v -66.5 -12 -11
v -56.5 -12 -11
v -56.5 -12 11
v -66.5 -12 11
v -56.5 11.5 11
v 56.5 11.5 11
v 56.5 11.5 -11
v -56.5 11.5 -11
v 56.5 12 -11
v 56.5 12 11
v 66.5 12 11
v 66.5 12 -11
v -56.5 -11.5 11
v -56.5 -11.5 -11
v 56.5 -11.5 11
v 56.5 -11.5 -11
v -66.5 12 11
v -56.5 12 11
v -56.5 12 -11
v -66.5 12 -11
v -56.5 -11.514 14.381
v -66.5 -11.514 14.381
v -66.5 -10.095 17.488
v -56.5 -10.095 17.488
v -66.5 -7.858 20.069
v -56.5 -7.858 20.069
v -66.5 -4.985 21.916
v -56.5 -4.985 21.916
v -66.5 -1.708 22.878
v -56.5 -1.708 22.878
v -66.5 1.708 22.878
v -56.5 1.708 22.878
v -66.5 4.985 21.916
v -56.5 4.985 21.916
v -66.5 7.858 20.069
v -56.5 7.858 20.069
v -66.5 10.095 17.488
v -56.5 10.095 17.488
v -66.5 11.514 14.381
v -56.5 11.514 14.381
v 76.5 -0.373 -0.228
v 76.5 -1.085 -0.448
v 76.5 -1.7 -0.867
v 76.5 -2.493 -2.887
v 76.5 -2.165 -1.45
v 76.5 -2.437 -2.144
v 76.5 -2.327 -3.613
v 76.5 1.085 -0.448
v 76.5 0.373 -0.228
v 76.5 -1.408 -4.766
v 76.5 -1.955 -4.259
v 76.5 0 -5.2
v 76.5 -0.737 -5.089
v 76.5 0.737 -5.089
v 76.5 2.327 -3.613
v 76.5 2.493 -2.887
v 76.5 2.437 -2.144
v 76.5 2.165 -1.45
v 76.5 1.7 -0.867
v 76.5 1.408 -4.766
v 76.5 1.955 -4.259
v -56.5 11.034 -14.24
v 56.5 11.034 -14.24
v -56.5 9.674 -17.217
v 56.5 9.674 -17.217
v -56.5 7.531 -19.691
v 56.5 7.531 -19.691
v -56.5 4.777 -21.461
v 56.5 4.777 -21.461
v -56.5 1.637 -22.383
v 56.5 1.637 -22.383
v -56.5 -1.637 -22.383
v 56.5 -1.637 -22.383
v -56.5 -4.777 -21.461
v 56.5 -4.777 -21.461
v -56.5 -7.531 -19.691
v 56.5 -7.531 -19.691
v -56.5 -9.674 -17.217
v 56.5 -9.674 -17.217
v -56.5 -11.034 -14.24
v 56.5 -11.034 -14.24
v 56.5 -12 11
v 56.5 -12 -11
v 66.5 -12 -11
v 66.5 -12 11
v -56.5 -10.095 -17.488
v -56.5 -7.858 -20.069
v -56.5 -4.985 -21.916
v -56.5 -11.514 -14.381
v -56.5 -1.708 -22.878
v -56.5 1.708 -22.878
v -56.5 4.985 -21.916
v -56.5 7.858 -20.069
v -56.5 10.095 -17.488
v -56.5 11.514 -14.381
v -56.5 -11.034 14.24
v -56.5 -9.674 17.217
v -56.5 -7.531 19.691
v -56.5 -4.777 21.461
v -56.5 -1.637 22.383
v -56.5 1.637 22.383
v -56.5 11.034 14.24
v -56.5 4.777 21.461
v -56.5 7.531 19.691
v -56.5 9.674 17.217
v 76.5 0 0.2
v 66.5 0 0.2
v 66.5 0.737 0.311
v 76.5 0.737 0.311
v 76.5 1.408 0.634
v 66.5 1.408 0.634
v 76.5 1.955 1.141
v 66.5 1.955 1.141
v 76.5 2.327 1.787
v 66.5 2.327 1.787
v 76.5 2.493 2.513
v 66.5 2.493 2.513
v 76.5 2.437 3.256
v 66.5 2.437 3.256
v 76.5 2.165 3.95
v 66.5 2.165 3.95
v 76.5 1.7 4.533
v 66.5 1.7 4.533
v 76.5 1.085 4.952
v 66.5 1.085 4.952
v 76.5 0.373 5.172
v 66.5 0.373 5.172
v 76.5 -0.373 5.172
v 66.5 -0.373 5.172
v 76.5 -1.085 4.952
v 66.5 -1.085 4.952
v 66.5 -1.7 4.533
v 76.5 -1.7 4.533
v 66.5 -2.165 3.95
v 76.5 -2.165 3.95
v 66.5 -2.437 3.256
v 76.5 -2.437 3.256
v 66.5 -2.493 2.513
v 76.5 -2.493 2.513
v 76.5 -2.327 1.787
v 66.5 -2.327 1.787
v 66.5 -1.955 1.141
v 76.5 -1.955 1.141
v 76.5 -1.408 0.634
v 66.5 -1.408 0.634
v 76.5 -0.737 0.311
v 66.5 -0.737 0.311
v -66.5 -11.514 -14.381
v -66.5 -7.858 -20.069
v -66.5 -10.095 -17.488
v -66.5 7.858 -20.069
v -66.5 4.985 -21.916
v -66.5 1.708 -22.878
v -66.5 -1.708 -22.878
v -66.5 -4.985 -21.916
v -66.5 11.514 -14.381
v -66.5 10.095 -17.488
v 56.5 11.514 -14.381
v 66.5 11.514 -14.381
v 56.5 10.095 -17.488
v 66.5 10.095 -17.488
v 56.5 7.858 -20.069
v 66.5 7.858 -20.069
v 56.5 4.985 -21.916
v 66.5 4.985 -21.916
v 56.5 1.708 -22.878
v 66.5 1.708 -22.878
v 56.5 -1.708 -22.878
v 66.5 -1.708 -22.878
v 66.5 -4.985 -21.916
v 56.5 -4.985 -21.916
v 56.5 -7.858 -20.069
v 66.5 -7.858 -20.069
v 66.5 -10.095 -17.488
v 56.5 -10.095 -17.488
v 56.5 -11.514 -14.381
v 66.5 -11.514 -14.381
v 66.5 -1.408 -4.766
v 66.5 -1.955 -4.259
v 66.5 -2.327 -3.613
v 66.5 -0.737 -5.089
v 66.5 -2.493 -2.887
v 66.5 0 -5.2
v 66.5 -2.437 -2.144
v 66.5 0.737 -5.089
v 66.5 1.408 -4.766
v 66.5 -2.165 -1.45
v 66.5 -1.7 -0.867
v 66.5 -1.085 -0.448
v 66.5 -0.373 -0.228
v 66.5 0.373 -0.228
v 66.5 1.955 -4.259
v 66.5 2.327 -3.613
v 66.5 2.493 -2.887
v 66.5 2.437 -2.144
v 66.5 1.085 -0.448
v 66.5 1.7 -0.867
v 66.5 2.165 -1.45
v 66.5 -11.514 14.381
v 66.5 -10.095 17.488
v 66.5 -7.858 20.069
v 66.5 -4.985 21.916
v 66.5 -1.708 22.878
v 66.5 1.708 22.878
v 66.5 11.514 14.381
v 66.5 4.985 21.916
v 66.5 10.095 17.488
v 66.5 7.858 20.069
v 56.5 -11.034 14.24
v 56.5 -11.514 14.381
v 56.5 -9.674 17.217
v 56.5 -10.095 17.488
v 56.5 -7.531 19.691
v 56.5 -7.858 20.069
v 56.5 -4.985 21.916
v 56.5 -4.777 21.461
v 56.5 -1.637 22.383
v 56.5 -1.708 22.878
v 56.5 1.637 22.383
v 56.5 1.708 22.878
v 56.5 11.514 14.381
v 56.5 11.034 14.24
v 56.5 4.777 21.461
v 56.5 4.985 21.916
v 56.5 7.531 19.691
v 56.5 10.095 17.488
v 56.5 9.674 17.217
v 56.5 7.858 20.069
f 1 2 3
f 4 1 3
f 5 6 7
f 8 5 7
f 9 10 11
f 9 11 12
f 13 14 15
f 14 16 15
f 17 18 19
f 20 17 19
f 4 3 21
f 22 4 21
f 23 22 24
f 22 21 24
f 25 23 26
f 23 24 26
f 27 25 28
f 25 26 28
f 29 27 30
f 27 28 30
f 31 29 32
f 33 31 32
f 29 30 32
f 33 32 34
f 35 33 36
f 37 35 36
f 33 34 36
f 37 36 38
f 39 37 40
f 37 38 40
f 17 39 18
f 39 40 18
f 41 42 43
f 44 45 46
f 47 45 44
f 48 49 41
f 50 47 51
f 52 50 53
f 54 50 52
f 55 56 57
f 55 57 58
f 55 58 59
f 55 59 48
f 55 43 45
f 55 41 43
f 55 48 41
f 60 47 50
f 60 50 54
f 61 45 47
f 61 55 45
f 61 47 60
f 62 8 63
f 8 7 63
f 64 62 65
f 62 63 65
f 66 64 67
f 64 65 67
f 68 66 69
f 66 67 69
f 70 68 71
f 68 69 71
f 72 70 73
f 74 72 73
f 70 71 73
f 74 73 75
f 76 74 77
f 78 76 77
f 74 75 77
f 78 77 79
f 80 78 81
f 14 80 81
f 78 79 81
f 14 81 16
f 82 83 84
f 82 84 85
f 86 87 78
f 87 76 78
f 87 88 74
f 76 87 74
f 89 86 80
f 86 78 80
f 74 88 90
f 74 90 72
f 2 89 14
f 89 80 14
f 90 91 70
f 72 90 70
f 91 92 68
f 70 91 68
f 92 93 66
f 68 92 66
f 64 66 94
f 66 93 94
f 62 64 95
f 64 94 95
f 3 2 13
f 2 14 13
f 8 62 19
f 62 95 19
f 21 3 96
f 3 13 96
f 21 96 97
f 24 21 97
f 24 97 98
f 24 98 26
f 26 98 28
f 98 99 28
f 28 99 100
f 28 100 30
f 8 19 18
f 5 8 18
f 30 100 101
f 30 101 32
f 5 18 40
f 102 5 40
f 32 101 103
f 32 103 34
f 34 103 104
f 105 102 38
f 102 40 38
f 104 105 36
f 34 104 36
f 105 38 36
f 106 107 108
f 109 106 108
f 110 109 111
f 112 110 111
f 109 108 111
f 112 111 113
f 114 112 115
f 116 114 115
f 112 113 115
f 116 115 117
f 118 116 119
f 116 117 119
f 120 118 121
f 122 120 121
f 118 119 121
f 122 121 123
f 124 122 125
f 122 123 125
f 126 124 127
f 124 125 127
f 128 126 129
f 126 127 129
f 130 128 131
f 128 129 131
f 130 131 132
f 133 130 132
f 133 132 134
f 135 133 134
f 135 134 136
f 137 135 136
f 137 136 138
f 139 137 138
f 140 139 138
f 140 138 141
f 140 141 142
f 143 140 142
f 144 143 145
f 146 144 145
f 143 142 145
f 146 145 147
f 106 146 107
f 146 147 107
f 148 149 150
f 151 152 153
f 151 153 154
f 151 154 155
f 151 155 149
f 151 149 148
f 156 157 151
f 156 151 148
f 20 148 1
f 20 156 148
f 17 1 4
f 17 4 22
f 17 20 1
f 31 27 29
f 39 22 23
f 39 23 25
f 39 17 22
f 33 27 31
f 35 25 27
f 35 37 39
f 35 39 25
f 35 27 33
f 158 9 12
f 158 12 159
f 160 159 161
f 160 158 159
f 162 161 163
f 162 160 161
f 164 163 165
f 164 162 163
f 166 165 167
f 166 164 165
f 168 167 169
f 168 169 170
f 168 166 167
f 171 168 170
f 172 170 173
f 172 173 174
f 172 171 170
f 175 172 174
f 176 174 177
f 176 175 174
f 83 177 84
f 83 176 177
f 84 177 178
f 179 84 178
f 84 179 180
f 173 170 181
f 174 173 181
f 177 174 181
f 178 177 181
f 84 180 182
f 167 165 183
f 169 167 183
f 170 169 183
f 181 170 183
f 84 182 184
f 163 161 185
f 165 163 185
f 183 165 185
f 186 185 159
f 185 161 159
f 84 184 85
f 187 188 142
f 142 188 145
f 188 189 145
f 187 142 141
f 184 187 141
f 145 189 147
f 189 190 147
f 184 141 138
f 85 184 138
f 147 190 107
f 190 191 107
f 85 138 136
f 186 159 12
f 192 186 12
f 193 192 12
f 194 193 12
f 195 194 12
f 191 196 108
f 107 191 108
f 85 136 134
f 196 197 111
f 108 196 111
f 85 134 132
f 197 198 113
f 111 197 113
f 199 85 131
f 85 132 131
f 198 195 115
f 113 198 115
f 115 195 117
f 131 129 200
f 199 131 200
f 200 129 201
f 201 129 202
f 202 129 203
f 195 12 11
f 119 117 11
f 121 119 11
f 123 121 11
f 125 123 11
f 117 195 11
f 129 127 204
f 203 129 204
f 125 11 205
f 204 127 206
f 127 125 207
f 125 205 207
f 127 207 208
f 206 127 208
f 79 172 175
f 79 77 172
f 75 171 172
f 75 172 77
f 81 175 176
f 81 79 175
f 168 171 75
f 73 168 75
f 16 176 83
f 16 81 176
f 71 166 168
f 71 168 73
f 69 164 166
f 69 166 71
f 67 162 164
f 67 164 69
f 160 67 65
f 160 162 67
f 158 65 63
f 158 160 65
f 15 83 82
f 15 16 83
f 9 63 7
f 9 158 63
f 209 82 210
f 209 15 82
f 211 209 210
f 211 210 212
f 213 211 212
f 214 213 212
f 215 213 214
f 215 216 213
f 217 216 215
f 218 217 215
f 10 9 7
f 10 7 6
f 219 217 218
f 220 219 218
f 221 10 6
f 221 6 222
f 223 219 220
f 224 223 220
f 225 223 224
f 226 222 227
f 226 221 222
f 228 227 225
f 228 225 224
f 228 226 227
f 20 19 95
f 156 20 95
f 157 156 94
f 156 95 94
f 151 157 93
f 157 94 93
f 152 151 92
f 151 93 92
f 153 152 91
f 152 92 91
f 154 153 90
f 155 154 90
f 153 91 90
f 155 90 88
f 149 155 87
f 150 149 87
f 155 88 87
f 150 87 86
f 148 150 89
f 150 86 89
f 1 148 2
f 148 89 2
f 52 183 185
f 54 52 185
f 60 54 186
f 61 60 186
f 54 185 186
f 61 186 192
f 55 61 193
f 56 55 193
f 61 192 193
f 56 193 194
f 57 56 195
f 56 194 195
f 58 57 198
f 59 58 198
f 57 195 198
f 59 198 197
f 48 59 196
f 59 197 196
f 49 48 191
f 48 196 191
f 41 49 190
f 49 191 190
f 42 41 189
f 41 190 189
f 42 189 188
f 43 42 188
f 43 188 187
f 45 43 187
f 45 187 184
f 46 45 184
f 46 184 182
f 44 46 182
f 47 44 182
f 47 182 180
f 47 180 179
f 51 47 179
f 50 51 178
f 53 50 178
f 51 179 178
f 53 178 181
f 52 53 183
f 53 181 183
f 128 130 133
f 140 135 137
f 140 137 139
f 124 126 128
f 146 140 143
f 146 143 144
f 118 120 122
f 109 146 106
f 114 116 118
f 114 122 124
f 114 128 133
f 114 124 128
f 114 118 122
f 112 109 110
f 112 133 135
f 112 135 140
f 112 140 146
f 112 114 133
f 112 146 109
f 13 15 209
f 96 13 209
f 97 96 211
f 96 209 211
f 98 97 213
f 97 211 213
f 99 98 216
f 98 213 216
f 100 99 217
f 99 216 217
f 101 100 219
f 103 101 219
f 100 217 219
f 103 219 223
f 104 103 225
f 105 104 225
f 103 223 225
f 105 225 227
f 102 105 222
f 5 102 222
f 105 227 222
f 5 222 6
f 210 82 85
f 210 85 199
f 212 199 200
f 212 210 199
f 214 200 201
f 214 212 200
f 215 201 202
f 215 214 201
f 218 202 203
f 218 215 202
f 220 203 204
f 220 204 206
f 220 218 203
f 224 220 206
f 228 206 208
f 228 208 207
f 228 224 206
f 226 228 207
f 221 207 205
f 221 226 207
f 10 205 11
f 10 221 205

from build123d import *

# Parameters (mm, degrees)
BOSS_EXTRUDE1_DEPTH = 56.5
BOSS_EXTRUDE2_DEPTH = 10
SKETCH3_R           = 2.5
BOSS_EXTRUDE3_DEPTH = 10


with BuildPart() as part:
    # Sketch1 → Boss-Extrude1 (new body, symmetric)
    with BuildSketch(Plane(origin=(0, 0, 0), x_dir=(0, 0, -1), z_dir=(1, 0, 0))):
        with BuildLine():
            Line((-11, 11.5), (11, 11.5))
            ThreePointArc((11, 11.5), (22.5, 0), (11, -11.5))
            Line((11, -11.5), (-11, -11.5))
            ThreePointArc((-11, -11.5), (-22.5, 0), (-11, 11.5))
        make_face()
    extrude(amount=BOSS_EXTRUDE1_DEPTH, both=True)

    # Sketch2 → Boss-Extrude2 (add)
    with BuildSketch(Plane(origin=(56.5, 0, 0), x_dir=(0, 0, -1), z_dir=(1, 0, 0))):
        with BuildLine():
            Line((-11, 12), (11, 12))
            ThreePointArc((11, 12), (23, 0), (11, -12))
            Line((11, -12), (-11, -12))
            ThreePointArc((-11, -12), (-23, 0), (-11, 12))
        make_face()
    boss_extrude2 = extrude(amount=BOSS_EXTRUDE2_DEPTH)

    # Mirror1: Boss-Extrude2 across plane
    add(boss_extrude2.mirror(Plane(origin=(0, 0, 0), x_dir=(0, 0, 1), z_dir=(1, 0, 0))))

    # Sketch3 → Boss-Extrude3 (add)
    with BuildSketch(Plane(origin=(66.5, 0, 0), x_dir=(0, 0, -1), z_dir=(1, 0, 0))):
        with Locations((-2.7, 0)):
            Circle(SKETCH3_R)
        with Locations((2.7, 0)):
            Circle(SKETCH3_R)
    extrude(amount=BOSS_EXTRUDE3_DEPTH)


solid = part.part
